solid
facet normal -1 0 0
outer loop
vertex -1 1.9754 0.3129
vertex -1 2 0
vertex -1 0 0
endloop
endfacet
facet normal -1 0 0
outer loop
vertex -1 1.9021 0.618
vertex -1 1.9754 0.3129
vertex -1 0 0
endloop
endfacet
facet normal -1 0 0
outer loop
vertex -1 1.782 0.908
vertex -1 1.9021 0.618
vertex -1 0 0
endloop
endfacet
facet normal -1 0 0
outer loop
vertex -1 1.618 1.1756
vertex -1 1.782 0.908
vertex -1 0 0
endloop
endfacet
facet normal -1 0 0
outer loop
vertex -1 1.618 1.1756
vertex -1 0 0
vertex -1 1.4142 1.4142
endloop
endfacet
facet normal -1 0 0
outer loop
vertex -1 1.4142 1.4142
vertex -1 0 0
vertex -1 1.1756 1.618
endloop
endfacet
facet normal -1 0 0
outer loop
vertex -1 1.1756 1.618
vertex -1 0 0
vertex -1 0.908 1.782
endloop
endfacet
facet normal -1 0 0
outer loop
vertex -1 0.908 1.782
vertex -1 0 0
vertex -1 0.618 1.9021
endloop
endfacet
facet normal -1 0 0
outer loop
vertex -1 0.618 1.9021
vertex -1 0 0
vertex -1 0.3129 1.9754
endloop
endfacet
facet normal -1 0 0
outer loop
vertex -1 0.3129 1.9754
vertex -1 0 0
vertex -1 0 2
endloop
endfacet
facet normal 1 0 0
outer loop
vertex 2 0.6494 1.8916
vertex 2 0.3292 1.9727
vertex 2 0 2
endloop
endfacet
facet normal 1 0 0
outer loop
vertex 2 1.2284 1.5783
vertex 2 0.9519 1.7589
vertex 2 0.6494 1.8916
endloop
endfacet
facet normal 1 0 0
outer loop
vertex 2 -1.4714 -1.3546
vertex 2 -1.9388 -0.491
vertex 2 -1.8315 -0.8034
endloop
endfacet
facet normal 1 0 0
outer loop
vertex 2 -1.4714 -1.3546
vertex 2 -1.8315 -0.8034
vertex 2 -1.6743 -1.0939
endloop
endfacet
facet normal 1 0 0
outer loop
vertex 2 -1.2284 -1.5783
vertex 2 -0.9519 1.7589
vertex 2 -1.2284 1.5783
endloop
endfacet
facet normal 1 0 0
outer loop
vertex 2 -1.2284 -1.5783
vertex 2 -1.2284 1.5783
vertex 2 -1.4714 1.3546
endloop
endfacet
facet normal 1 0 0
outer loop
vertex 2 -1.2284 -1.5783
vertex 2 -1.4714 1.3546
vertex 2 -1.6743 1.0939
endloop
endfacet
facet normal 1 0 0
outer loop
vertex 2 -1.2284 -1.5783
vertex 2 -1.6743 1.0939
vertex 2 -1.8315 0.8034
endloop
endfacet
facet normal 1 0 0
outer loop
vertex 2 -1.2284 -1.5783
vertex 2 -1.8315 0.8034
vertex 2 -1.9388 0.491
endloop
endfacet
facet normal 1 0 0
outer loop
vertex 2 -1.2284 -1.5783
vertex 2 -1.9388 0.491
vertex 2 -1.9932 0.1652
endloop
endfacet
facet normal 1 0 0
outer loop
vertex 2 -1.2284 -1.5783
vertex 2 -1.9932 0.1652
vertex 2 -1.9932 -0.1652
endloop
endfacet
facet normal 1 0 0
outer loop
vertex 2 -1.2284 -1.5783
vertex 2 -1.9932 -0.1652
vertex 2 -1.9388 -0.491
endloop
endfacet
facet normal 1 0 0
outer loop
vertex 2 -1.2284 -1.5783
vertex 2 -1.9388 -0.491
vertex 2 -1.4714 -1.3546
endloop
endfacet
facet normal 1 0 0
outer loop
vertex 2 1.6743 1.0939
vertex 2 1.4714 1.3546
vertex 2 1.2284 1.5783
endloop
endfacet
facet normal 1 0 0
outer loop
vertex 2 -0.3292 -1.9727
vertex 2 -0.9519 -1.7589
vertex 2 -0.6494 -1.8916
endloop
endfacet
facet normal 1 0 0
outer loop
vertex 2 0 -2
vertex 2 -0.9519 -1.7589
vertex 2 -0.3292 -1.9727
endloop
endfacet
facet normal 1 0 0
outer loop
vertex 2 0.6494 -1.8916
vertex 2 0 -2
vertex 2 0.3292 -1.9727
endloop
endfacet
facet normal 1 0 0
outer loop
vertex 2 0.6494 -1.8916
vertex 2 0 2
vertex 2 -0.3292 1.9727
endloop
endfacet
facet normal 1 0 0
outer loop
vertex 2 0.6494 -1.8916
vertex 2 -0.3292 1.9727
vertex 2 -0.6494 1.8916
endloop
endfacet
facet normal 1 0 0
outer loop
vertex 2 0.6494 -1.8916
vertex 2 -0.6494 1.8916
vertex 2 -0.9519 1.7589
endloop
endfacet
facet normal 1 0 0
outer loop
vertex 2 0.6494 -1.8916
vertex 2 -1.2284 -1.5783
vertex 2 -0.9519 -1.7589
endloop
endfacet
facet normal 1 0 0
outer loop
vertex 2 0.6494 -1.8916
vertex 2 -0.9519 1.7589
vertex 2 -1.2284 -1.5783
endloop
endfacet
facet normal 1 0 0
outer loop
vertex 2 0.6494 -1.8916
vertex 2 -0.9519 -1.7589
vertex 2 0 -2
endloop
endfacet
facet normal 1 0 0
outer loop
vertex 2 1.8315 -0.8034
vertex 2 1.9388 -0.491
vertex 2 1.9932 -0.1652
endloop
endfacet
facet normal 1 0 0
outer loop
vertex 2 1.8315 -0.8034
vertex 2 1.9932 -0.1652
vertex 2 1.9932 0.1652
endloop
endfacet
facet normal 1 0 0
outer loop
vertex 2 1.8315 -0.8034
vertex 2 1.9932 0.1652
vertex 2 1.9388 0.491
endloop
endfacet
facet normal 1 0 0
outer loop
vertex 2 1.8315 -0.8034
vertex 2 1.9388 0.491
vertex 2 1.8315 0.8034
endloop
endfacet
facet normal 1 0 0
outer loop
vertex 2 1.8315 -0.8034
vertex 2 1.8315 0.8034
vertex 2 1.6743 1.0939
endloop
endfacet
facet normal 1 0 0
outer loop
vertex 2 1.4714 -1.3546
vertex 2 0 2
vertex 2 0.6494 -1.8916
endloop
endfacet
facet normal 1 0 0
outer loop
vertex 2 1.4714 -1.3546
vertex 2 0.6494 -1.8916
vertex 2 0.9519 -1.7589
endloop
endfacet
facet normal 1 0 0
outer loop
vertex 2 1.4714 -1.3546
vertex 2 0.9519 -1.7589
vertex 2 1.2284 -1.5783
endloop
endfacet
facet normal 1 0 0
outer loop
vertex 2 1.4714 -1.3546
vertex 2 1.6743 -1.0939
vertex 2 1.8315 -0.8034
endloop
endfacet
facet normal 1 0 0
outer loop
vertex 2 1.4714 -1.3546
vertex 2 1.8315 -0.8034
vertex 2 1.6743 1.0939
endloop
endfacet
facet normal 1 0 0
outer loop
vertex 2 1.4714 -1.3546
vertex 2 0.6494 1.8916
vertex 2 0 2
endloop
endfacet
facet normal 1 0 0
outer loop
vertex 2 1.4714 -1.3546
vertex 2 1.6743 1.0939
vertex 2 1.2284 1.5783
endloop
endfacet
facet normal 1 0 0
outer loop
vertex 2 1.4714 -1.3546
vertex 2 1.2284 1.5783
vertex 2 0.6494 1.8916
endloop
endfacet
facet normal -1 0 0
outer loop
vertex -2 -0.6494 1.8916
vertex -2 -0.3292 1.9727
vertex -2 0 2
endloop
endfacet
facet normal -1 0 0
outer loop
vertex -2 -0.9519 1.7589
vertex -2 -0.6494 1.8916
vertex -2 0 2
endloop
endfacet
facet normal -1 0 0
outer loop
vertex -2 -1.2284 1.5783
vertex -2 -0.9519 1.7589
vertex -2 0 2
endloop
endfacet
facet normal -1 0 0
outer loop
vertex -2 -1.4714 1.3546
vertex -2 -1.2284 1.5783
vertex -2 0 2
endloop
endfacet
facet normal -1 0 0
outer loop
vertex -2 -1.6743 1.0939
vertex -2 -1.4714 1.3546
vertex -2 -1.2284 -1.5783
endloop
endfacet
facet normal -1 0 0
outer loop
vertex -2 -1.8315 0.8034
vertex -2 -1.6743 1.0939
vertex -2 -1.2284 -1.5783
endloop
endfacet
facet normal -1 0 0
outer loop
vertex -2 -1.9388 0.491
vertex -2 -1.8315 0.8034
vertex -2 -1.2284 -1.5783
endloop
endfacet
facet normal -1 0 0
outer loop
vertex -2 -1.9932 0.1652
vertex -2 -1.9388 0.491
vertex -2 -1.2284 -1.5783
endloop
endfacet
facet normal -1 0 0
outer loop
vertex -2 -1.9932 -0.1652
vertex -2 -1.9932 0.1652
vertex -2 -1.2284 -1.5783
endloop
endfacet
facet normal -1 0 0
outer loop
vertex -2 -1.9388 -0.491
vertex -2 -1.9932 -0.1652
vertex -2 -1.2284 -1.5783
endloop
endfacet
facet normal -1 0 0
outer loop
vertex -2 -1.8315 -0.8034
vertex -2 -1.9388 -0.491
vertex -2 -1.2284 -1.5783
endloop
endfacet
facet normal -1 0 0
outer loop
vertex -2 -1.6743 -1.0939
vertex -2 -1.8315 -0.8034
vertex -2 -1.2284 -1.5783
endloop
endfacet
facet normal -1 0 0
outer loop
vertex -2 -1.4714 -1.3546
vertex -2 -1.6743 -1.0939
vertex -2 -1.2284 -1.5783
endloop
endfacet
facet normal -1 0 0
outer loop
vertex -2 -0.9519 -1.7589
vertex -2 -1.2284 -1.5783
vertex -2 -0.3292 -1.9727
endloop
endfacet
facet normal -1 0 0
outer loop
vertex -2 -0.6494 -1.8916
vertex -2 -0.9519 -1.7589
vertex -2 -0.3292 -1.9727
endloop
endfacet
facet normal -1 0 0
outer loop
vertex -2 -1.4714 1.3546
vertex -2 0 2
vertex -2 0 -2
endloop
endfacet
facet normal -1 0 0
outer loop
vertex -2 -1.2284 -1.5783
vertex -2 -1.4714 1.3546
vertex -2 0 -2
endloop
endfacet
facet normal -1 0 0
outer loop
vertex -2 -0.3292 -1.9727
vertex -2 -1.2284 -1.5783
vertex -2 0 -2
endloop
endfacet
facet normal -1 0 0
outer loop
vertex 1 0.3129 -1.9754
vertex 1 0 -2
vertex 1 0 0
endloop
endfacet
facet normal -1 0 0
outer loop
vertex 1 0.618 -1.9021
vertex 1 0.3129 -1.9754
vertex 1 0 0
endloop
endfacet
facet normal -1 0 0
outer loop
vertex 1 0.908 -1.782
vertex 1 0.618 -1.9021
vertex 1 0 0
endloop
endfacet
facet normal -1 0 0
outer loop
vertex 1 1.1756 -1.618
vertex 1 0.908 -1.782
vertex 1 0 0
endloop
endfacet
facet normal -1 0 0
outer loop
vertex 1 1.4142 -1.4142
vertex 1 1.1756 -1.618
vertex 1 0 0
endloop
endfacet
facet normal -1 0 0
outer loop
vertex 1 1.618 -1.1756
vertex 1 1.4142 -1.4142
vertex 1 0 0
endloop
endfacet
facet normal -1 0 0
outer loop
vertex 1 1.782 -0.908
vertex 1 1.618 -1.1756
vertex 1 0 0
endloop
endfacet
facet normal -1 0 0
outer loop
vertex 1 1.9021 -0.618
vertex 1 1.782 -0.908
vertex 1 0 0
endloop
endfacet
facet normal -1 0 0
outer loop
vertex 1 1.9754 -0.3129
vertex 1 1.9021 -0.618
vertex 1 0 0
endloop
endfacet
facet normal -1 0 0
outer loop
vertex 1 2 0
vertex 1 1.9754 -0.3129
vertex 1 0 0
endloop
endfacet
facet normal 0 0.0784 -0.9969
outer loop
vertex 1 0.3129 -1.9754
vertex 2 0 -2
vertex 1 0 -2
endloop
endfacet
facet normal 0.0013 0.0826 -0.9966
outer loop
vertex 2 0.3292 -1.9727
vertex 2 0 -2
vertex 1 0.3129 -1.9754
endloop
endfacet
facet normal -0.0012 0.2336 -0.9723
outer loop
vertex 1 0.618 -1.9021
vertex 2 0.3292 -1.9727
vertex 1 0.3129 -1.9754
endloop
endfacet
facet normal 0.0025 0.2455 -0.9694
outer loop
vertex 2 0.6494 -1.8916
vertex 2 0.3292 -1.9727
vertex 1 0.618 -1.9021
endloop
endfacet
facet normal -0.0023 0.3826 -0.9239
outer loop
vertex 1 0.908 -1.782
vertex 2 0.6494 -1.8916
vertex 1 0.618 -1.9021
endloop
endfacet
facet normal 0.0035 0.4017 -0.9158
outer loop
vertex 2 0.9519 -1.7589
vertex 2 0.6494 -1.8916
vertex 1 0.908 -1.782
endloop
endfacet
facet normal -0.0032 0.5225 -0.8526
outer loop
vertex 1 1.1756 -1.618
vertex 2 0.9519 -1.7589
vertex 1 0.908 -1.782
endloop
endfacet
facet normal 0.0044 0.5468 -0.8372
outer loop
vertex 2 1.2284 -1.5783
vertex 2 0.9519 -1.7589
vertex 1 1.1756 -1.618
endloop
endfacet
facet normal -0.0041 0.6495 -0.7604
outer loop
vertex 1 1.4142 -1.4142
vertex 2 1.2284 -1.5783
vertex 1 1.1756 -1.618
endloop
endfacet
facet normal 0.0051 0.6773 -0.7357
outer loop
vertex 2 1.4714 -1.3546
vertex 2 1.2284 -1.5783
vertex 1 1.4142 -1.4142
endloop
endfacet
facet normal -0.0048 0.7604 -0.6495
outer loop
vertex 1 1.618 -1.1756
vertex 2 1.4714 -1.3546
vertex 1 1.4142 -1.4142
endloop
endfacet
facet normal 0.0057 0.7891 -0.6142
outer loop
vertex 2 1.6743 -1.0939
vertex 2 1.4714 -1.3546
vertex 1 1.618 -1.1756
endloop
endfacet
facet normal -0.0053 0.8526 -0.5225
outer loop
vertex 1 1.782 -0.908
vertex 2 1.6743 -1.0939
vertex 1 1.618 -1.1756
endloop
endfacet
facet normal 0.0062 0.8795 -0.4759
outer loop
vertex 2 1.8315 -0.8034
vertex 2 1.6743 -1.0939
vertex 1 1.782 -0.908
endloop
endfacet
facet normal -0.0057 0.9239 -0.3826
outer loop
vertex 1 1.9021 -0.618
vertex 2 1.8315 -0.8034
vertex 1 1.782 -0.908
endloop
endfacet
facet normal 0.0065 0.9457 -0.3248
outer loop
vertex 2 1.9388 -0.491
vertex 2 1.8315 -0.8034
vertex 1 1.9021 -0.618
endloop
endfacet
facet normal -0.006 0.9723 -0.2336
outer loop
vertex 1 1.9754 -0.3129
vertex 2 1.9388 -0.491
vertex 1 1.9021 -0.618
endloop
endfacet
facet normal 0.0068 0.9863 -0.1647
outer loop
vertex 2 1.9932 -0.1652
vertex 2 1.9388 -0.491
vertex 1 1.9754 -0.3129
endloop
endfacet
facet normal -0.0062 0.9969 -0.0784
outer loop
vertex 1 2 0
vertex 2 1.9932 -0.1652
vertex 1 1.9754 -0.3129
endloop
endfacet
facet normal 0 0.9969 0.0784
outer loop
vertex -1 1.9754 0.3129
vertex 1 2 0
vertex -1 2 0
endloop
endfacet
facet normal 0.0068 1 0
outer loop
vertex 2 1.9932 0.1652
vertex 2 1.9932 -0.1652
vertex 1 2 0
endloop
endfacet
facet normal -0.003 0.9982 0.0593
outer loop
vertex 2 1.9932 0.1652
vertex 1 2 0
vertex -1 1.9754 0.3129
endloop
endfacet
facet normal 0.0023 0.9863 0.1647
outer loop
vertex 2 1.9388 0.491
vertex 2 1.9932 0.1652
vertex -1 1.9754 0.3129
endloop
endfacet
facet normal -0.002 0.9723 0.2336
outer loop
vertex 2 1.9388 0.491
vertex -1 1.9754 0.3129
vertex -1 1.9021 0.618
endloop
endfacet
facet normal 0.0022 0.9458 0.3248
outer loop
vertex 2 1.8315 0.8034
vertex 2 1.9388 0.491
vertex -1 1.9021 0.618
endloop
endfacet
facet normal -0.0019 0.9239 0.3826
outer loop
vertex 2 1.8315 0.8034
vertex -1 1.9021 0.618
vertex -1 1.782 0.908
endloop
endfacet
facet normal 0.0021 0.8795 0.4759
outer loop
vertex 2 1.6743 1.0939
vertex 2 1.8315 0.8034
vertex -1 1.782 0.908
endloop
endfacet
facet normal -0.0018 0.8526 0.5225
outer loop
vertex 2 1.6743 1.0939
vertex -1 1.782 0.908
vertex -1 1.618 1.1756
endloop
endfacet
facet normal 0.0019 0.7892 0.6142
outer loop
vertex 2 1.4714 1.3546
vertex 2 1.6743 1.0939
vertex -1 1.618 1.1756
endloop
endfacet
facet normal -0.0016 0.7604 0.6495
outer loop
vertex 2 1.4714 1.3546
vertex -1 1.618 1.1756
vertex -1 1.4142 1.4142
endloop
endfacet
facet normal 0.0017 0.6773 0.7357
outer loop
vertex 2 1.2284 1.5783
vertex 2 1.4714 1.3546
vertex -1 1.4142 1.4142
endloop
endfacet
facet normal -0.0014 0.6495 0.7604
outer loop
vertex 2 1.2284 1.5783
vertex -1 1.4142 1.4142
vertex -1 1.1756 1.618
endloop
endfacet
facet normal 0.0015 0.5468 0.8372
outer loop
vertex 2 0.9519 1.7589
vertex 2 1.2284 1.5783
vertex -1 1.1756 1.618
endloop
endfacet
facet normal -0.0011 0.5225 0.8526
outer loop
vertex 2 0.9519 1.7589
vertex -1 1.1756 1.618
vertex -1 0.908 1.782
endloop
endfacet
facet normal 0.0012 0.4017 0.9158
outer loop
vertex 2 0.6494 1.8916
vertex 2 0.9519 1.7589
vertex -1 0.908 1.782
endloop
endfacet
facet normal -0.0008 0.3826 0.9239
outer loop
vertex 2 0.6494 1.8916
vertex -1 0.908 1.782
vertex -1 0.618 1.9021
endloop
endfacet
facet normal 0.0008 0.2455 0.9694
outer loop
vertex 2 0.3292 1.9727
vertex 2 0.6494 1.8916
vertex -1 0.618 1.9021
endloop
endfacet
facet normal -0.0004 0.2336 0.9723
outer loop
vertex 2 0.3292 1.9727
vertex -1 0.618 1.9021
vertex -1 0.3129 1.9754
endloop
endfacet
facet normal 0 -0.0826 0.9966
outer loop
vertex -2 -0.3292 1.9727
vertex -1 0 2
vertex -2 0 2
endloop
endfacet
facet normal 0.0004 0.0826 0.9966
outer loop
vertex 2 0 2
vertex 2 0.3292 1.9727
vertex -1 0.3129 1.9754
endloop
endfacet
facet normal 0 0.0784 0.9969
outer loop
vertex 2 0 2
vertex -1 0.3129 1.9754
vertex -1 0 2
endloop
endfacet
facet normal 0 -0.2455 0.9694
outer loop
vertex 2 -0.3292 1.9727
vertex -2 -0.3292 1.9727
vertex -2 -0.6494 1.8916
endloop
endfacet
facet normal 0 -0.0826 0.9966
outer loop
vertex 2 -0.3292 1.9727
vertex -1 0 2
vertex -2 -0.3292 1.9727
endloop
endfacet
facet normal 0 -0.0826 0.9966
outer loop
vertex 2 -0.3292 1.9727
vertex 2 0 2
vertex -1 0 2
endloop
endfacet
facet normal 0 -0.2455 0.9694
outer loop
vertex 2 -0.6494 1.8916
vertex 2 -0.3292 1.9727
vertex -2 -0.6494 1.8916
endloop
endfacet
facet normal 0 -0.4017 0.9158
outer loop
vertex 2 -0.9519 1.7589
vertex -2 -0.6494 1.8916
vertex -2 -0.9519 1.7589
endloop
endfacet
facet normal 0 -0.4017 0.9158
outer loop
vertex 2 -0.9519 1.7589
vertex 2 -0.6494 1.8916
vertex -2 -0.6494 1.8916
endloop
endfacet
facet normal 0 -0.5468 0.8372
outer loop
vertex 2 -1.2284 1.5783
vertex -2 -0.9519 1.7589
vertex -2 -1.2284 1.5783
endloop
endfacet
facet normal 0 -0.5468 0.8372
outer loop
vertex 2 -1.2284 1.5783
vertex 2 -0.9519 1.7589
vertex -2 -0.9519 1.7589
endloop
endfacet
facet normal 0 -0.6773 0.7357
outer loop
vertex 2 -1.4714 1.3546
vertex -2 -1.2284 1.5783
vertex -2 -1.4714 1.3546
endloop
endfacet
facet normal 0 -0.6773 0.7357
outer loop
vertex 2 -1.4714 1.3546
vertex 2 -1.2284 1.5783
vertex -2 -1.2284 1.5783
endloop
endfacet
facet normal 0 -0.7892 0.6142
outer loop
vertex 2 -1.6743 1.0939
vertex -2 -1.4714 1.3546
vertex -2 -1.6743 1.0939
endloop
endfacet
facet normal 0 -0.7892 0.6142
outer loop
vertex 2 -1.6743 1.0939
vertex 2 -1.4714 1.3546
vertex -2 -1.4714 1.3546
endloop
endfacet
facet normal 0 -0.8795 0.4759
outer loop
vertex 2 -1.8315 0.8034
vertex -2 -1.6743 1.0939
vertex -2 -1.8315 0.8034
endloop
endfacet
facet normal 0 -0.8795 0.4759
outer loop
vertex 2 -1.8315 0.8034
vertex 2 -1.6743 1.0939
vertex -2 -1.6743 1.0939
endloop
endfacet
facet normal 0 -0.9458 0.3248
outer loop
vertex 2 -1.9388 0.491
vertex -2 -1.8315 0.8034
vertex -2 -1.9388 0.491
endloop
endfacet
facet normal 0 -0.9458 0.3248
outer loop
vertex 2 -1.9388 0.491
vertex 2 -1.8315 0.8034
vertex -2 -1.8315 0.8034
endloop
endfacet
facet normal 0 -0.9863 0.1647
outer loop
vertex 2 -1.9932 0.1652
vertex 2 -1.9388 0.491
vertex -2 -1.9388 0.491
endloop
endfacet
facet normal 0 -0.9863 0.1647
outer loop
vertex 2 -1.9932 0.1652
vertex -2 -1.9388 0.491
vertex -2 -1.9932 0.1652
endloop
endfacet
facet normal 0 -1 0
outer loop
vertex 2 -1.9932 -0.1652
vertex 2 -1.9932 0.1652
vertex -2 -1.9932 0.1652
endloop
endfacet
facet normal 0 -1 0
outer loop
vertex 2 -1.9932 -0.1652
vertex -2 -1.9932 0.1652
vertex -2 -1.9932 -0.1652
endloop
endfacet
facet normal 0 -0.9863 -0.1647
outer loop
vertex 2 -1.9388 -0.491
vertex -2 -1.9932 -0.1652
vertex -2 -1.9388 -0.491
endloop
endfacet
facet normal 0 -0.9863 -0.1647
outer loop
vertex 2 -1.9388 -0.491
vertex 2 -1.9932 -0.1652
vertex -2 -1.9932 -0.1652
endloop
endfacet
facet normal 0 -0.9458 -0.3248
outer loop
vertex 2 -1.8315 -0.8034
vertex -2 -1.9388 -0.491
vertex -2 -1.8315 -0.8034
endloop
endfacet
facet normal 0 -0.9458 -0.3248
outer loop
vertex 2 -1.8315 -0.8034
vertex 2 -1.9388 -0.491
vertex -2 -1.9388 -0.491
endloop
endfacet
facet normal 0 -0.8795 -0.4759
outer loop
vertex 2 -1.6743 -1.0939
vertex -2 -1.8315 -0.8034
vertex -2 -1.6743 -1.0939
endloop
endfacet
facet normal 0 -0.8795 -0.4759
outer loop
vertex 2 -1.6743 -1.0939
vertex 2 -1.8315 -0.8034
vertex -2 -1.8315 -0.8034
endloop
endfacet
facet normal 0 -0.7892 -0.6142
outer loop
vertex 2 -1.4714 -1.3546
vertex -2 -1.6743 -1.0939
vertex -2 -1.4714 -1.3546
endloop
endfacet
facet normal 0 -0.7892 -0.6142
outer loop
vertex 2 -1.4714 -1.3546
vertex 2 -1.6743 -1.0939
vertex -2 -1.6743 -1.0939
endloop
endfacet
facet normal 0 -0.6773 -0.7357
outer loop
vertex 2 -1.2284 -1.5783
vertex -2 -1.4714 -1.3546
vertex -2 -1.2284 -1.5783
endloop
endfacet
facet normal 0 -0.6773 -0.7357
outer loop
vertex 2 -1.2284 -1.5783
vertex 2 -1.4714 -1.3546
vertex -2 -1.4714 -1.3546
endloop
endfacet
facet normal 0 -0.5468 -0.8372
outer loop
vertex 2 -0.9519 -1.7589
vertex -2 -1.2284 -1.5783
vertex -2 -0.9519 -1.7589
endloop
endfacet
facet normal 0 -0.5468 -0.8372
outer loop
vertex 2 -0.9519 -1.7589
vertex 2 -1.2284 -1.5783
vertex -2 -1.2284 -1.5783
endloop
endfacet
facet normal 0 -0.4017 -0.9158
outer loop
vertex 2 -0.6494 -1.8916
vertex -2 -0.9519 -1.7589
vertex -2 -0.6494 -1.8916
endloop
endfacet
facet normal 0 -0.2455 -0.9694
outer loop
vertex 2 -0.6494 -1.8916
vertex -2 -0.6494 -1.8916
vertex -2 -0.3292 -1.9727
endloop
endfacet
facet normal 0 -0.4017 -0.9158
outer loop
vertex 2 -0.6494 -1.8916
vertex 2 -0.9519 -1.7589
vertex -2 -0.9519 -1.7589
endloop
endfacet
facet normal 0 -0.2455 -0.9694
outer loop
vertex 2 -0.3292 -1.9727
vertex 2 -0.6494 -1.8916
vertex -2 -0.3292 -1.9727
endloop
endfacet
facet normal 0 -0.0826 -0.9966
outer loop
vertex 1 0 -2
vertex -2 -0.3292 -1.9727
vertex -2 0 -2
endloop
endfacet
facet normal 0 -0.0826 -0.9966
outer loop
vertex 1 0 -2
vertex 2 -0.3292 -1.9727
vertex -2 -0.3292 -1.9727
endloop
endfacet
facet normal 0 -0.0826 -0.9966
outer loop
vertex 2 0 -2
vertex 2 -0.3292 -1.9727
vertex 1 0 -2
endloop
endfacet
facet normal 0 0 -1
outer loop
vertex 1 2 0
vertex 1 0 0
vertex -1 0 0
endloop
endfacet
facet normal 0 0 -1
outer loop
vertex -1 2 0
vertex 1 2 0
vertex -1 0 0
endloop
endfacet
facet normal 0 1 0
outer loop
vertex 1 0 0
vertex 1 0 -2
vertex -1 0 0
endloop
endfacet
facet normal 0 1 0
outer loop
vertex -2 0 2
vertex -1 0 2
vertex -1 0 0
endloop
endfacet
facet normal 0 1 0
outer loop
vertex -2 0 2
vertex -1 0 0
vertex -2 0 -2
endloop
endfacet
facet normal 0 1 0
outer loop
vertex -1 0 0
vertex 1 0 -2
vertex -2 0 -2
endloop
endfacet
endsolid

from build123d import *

# Parameters (mm, degrees)
SKETCH1_R           = 2
BOSS_EXTRUDE1_DEPTH = 2
CUT_EXTRUDE1_DEPTH  = 4


with BuildPart() as part:
    # Sketch1 → Boss-Extrude1 (new body, symmetric)
    with BuildSketch(Plane(origin=(0, 0, 0), x_dir=(0, 0, -1), z_dir=(1, 0, 0))):
        Circle(SKETCH1_R)
    extrude(amount=BOSS_EXTRUDE1_DEPTH, both=True)

    # Sketch3 → Cut-Extrude1 (cut)
    with BuildSketch(Plane(origin=(0, 0, 0), x_dir=(1, 0, 0), z_dir=(0, 1, 0))):
        Polygon((-1, 2), (1, 2), (1, 0), (-1, 0), (-1, -2), (-2, -2), (-2, 2), align=None)
    extrude(amount=CUT_EXTRUDE1_DEPTH, mode=Mode.SUBTRACT)


solid = part.part
